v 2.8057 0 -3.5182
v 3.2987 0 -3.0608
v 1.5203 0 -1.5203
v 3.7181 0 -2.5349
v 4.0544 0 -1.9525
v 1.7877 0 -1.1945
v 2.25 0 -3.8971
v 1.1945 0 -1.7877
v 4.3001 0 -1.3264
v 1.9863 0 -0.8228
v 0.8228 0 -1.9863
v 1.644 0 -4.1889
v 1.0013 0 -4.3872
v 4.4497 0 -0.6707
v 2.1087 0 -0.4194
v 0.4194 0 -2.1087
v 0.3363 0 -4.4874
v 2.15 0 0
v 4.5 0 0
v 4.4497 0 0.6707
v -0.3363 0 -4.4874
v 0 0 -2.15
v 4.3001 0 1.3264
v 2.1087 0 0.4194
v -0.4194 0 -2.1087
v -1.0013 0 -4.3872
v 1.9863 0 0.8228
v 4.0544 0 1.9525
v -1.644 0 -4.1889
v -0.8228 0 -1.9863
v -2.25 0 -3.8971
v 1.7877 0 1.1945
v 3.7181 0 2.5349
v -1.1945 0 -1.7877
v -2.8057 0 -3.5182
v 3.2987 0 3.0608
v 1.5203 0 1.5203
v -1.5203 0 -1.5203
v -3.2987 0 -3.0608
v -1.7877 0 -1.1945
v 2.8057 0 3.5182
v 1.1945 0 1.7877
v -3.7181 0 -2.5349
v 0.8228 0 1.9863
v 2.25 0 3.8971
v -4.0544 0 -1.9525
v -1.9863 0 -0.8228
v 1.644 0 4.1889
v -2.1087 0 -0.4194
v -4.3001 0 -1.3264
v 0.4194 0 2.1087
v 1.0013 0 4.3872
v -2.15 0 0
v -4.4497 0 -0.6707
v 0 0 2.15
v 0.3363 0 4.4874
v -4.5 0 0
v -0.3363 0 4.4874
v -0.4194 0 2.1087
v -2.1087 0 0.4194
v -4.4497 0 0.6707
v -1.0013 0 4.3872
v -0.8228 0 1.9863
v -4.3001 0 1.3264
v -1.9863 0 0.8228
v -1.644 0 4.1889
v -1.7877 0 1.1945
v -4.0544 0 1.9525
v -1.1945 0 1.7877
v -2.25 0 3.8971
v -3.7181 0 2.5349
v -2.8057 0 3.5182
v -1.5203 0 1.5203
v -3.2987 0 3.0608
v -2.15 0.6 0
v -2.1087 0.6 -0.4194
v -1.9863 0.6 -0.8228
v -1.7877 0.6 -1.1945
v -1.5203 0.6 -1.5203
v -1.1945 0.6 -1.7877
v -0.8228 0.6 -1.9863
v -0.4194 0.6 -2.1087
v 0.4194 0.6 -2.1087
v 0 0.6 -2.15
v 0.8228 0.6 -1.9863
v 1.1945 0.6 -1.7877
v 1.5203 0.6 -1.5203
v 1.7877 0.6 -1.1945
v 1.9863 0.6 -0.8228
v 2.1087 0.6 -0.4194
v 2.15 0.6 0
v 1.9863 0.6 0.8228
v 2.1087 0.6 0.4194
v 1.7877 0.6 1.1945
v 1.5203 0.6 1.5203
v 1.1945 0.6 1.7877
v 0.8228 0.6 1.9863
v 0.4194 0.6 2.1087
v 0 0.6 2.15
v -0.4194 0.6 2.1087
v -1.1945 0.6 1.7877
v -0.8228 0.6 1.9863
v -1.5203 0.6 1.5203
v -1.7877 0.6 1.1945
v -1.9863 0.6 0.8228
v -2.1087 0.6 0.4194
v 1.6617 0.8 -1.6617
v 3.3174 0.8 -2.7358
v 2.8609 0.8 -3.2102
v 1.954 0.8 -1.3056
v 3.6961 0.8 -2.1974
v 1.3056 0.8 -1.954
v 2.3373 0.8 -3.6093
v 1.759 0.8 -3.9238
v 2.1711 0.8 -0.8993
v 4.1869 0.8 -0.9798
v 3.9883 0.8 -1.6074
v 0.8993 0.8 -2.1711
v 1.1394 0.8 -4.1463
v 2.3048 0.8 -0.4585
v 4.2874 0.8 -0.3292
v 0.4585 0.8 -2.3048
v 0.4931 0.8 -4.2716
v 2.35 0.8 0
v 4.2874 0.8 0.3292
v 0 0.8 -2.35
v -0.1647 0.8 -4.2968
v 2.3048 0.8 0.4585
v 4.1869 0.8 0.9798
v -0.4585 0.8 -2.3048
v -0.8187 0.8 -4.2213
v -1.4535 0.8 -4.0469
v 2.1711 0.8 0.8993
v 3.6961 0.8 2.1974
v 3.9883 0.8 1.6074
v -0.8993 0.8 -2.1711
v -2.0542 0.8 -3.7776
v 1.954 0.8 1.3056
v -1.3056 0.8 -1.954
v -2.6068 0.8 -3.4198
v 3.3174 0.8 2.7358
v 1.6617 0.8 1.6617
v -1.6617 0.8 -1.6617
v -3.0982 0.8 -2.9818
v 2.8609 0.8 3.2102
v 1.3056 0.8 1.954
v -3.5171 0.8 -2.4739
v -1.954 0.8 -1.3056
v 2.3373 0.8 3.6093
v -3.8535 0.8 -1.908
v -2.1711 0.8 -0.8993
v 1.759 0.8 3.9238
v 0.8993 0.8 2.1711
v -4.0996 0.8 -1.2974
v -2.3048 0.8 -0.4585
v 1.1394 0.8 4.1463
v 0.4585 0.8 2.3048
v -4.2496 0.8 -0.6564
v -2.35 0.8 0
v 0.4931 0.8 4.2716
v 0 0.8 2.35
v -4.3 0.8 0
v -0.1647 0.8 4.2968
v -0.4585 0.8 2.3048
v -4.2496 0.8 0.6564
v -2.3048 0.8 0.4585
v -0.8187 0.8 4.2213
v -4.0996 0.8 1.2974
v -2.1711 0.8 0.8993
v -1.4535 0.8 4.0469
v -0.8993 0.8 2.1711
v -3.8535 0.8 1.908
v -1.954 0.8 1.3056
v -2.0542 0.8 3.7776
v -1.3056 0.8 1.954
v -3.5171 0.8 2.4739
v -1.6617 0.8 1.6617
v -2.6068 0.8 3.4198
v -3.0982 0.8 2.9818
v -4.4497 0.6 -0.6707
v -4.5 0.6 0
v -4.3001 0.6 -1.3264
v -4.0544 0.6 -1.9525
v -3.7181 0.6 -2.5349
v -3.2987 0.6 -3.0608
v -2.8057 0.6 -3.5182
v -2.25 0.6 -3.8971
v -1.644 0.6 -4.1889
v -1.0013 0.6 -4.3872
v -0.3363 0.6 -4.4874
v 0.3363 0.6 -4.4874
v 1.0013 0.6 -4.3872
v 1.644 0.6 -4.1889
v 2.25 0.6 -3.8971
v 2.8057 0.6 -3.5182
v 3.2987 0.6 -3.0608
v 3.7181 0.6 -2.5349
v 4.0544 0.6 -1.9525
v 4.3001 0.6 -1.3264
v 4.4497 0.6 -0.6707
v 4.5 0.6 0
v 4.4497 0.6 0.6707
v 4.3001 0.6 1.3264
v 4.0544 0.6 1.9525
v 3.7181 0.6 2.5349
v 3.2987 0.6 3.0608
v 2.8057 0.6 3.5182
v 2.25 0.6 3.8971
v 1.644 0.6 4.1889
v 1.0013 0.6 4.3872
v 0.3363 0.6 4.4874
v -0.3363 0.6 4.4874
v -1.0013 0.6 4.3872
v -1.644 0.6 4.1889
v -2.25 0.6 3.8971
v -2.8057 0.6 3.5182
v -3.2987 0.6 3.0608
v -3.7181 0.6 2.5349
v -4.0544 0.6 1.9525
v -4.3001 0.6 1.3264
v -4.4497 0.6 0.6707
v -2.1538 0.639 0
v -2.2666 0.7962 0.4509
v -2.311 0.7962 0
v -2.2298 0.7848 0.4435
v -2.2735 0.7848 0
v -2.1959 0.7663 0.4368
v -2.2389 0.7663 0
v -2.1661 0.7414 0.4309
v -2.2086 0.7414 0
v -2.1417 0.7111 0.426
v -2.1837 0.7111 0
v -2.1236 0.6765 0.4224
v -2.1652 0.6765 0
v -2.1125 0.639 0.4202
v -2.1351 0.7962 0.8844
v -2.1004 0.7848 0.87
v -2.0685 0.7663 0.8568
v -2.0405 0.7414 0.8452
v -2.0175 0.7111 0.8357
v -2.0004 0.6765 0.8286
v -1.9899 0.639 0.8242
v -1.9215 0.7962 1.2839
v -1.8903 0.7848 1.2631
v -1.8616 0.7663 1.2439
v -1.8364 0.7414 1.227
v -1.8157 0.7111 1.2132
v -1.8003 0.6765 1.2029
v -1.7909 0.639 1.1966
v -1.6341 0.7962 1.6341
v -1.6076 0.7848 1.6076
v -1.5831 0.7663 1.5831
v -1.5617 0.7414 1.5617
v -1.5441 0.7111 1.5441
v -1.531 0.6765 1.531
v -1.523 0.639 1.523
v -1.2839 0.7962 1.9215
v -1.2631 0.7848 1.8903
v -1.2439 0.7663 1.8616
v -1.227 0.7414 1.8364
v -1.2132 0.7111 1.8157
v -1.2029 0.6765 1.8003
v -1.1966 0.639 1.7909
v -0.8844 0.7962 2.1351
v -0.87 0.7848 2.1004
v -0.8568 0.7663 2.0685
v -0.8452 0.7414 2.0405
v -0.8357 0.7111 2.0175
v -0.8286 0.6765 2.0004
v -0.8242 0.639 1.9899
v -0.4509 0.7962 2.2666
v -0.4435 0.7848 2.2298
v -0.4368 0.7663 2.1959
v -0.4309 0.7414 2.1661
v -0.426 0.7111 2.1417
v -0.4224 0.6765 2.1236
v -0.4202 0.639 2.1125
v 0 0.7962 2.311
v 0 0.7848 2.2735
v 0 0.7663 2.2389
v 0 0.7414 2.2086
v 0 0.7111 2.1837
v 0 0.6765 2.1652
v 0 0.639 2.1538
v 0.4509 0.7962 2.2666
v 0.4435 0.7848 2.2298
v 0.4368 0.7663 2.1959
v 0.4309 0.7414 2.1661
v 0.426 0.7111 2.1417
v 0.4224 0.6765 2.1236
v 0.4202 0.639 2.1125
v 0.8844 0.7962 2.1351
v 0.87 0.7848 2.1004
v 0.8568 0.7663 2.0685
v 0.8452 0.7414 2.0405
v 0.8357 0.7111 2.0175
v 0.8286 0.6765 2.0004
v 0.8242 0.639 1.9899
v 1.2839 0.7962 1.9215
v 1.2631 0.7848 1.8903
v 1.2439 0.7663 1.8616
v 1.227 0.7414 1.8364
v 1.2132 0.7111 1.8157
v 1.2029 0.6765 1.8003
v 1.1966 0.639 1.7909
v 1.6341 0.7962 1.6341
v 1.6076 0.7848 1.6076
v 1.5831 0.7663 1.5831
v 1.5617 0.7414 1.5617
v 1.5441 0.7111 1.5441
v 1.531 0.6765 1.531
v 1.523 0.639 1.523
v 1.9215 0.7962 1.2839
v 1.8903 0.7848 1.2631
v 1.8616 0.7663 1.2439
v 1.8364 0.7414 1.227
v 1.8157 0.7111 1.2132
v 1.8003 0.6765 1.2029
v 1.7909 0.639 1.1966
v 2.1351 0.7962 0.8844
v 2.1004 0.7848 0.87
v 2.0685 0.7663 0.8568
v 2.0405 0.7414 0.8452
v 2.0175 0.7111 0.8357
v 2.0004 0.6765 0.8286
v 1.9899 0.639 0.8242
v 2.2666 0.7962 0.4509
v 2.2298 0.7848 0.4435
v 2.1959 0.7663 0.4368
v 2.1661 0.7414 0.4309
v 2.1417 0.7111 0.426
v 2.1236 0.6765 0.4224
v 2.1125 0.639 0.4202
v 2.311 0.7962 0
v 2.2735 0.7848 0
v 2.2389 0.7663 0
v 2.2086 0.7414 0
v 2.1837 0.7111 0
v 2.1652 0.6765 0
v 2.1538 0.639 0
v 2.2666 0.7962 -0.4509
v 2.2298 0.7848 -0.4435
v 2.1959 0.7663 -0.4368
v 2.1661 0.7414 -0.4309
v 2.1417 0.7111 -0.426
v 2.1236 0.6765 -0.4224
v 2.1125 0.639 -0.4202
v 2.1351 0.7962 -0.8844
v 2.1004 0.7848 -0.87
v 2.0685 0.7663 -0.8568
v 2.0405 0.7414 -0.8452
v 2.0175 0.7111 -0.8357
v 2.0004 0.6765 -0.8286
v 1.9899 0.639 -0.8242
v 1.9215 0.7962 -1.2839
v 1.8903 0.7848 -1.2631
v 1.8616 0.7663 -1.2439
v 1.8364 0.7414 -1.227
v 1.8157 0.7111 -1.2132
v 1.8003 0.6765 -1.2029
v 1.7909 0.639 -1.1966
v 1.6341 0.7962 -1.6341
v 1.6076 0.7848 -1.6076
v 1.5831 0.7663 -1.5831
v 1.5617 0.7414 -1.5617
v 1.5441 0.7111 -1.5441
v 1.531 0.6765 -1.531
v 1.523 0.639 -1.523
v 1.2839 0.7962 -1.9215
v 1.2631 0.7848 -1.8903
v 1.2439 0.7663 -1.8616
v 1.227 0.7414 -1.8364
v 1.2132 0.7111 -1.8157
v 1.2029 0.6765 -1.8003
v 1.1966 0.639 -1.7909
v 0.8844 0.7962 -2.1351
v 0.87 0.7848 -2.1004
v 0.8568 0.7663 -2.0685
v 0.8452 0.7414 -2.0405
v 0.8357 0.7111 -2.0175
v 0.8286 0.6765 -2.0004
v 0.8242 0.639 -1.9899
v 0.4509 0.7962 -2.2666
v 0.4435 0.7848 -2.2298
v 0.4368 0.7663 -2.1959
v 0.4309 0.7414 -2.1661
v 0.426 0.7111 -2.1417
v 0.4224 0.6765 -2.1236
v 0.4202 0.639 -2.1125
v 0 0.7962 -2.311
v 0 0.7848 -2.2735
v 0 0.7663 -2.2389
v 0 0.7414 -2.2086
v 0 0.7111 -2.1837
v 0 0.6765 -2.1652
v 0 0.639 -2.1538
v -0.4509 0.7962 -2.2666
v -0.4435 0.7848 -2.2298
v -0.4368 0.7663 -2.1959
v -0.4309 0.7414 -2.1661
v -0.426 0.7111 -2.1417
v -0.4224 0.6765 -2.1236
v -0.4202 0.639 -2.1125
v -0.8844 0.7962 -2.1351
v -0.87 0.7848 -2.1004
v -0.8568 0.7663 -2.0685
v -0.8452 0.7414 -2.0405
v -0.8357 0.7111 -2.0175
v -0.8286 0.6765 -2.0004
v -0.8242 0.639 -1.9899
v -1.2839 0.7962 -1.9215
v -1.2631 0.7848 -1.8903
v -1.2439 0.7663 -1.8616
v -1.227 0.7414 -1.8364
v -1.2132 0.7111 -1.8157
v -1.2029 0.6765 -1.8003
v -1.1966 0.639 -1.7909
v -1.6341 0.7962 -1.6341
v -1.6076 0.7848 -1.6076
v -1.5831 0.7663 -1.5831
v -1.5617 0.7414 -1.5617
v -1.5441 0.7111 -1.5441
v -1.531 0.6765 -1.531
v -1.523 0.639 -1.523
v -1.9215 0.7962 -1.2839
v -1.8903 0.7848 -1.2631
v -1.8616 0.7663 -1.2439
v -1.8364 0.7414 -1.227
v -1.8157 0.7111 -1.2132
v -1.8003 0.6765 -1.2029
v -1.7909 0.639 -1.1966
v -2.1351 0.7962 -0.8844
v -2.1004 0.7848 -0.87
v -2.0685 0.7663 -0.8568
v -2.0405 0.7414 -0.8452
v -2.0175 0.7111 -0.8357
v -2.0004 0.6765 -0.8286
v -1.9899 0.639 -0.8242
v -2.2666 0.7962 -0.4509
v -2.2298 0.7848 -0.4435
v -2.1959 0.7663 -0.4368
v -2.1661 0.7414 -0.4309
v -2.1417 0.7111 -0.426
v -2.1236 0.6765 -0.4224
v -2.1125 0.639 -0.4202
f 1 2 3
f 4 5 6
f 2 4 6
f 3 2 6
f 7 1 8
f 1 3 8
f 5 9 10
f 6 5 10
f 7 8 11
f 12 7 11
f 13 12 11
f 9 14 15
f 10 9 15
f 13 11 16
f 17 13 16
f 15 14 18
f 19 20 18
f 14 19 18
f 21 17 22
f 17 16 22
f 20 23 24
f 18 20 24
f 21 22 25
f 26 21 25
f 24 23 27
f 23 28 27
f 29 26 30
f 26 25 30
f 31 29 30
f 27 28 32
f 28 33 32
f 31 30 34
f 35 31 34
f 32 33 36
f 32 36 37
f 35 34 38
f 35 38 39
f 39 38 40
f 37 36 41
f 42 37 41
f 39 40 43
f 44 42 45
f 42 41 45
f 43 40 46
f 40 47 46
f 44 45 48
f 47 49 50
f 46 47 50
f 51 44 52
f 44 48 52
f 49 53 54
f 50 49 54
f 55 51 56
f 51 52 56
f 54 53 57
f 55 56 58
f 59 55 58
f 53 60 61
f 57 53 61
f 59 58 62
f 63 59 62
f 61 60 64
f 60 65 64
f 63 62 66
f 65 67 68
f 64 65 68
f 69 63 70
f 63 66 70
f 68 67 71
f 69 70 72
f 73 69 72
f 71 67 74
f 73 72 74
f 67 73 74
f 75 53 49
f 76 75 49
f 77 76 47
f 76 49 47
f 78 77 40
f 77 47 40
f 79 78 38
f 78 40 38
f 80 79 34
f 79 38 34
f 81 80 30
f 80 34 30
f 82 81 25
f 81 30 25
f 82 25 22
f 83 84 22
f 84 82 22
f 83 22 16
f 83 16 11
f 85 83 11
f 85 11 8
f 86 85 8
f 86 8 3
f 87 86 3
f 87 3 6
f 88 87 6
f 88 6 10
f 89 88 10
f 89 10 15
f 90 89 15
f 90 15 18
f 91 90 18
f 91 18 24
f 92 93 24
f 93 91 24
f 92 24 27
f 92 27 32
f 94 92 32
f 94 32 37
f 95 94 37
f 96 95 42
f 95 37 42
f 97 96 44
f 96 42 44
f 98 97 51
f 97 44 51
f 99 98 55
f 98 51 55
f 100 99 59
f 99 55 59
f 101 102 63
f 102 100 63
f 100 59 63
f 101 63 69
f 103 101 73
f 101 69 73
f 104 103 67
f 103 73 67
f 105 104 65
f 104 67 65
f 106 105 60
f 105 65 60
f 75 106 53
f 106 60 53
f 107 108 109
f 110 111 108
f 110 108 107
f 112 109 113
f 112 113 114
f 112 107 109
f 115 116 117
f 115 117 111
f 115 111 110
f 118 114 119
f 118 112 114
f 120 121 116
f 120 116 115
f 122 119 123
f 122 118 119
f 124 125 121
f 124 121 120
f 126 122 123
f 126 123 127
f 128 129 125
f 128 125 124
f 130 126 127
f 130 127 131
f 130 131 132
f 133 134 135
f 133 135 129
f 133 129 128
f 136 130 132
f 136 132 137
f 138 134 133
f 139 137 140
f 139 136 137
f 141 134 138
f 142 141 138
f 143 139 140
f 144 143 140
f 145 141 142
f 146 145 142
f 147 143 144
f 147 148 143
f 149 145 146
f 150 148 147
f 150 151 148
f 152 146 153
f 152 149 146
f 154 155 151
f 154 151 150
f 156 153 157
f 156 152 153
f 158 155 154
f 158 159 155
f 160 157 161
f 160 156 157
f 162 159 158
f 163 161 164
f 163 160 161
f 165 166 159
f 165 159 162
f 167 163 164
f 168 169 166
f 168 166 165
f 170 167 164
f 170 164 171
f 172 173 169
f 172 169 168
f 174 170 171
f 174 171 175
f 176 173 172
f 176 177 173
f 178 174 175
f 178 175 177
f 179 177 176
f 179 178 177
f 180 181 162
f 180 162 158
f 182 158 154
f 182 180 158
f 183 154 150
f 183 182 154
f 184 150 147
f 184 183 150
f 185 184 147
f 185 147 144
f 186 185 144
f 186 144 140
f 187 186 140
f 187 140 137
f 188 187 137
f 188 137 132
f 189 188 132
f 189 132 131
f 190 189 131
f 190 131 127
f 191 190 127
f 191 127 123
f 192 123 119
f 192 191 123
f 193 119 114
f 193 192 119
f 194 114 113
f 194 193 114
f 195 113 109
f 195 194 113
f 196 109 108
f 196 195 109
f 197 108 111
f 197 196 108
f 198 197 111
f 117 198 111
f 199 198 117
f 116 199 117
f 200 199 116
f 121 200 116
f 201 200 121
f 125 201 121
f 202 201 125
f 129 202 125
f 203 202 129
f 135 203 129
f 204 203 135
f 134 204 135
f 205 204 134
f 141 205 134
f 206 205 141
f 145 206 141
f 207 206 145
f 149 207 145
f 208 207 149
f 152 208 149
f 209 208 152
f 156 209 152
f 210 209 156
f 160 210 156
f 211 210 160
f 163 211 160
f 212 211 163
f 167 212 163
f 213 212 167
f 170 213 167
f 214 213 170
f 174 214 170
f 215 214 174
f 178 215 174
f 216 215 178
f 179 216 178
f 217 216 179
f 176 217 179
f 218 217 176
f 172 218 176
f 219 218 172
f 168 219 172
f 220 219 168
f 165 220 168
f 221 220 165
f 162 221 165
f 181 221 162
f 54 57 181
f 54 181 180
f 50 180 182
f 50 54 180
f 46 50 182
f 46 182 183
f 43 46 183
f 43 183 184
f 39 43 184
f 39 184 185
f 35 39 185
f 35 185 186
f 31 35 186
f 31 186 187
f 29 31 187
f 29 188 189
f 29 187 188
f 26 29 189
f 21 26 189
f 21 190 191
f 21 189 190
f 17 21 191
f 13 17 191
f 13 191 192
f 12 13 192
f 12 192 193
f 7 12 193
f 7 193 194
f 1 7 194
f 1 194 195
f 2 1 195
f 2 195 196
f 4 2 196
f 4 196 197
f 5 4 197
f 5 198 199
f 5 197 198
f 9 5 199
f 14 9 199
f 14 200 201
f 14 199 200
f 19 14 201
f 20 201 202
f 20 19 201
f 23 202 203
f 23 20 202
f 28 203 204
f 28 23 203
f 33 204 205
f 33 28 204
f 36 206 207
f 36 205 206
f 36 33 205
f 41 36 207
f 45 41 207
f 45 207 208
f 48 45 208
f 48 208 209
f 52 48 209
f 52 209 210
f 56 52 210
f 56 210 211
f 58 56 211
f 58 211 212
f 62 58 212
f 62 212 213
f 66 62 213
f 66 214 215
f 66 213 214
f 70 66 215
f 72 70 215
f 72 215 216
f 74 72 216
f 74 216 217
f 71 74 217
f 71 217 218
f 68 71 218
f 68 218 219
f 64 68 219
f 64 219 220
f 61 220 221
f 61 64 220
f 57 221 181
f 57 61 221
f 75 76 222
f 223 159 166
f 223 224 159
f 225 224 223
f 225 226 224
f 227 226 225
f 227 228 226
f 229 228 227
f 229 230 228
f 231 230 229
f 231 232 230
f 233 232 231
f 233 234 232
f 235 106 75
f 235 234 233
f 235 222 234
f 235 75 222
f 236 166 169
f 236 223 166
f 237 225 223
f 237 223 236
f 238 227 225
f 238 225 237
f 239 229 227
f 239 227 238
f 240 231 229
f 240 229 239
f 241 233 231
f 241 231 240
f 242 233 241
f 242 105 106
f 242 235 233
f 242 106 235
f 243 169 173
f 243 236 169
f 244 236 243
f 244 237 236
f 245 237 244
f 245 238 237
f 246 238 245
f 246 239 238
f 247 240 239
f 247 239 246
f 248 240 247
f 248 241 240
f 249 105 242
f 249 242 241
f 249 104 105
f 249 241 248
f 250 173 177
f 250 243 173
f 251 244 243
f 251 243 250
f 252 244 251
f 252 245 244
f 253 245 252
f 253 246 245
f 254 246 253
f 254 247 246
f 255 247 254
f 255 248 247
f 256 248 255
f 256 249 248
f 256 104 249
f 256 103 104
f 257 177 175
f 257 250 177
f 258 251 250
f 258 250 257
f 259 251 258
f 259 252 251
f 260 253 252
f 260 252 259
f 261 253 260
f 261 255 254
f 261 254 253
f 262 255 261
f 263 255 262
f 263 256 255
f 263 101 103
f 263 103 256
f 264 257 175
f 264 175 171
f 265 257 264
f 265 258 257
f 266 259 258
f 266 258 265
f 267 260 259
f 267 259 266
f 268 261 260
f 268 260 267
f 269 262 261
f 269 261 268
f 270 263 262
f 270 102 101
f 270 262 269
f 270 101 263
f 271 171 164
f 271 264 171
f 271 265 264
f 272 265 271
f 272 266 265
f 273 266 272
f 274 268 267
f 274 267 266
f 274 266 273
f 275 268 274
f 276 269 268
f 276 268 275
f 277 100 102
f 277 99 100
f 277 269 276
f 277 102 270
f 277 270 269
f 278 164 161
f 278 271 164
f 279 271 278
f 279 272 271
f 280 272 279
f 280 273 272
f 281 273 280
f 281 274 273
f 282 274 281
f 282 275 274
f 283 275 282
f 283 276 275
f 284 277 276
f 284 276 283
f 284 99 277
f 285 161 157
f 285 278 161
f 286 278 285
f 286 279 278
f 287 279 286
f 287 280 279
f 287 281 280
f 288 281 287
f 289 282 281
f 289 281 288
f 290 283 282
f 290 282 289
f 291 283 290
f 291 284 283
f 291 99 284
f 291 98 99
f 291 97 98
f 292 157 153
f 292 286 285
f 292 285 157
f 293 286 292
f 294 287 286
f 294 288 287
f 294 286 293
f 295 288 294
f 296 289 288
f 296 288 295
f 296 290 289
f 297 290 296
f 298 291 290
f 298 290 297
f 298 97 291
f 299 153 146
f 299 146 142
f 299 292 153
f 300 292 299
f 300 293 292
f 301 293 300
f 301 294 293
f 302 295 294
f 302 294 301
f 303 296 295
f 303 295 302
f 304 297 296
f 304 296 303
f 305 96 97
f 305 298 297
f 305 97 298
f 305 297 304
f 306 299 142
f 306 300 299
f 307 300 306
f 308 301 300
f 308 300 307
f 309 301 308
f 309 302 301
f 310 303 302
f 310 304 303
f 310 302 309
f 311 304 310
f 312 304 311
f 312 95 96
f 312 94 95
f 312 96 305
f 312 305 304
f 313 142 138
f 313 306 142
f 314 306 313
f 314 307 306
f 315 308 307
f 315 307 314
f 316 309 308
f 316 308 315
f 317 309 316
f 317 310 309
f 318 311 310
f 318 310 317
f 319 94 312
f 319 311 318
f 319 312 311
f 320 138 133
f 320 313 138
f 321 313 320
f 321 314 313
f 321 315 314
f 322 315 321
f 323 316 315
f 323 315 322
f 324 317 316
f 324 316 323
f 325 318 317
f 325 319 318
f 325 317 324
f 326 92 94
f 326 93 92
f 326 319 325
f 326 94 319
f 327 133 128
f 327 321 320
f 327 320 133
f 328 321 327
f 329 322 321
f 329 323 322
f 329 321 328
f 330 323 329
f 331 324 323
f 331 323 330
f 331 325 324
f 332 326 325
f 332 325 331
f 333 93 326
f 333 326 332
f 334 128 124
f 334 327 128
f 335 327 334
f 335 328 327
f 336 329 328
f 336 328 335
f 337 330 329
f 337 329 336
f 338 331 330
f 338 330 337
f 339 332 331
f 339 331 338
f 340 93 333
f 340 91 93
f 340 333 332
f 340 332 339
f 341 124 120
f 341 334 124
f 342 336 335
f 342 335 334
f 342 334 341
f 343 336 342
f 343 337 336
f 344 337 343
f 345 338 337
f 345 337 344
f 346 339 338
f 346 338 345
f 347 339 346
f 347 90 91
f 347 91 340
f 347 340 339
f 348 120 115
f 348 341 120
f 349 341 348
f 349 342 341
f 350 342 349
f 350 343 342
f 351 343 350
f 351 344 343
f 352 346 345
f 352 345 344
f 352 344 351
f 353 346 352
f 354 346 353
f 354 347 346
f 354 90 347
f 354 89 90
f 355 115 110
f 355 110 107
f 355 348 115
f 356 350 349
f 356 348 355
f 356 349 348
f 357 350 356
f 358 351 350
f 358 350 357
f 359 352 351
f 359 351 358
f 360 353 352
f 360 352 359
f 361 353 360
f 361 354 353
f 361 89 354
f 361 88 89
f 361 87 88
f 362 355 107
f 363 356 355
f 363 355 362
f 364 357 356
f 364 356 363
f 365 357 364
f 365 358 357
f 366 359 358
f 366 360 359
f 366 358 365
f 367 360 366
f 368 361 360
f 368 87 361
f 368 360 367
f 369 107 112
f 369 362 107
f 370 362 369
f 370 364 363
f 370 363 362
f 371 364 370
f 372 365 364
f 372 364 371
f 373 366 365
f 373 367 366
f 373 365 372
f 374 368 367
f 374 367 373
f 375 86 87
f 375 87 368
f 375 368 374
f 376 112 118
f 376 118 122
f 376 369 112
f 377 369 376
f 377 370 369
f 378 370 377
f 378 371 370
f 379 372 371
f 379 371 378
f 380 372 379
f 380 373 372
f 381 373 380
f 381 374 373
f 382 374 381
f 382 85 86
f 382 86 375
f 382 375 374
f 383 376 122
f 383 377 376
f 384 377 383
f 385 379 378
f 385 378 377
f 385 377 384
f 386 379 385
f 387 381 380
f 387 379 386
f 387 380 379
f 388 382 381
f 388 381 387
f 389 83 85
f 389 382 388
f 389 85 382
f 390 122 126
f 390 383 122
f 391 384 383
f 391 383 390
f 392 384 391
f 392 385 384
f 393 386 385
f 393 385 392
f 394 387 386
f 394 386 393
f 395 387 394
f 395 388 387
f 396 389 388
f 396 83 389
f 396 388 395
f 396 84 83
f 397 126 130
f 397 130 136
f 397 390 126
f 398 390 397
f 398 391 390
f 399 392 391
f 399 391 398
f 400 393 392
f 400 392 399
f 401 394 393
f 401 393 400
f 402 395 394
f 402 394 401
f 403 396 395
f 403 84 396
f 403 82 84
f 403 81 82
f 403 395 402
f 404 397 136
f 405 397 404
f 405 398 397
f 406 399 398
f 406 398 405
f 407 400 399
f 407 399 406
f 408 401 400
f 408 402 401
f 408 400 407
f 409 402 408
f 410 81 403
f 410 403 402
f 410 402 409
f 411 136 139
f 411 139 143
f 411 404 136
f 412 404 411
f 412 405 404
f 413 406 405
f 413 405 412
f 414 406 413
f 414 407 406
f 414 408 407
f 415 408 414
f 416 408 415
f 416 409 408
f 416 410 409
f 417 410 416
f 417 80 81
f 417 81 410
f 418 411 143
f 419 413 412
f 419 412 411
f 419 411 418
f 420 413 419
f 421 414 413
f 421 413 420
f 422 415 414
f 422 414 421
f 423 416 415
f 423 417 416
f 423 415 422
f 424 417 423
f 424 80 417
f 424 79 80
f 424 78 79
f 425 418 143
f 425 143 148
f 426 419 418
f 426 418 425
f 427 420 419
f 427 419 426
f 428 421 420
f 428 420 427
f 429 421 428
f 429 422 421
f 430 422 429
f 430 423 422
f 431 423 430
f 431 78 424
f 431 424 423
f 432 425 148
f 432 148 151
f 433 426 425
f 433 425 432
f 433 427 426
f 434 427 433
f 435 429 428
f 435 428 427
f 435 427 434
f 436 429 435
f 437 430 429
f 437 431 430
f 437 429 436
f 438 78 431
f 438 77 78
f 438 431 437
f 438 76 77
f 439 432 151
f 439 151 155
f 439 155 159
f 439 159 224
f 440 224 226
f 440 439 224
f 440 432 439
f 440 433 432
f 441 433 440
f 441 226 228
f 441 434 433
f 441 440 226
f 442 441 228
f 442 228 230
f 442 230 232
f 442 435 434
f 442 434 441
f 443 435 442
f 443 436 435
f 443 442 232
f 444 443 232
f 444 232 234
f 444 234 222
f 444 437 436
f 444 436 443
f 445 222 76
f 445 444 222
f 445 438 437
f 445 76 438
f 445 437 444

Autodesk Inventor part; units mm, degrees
ref_plane "YZ Plane" through (0, 0, 0) normal (1, 0, 0) x (0, 1, 0)
ref_plane "XZ Plane" through (0, 0, 0) normal (0, 1, 0) x (-1, 0, 0)
ref_plane "XY Plane" through (0, 0, 0) normal (0, 0, 1) x (1, 0, 0)
sketch "Sketch1" plane through (0, 0, 0) normal (0, 1, 0) x (-1, 0, 0)
  circle A0 centre (0, 0) radius 2.15
  circle A1 centre (0, 0) radius 4.5
  dimension "d0" = 4.3
  dimension "d1" = 9
extrude "Extrusion1" add sketch "Sketch1" along normal blind 0.8
chamfer "Chamfer1" distance 0.2 angle 45 1 edges at (4.5, 0.8, 0)
fillet "Fillet1" radius 0.2 1 edges at (2.15, 0.8, 0)
properties part number "GolillaM4"
